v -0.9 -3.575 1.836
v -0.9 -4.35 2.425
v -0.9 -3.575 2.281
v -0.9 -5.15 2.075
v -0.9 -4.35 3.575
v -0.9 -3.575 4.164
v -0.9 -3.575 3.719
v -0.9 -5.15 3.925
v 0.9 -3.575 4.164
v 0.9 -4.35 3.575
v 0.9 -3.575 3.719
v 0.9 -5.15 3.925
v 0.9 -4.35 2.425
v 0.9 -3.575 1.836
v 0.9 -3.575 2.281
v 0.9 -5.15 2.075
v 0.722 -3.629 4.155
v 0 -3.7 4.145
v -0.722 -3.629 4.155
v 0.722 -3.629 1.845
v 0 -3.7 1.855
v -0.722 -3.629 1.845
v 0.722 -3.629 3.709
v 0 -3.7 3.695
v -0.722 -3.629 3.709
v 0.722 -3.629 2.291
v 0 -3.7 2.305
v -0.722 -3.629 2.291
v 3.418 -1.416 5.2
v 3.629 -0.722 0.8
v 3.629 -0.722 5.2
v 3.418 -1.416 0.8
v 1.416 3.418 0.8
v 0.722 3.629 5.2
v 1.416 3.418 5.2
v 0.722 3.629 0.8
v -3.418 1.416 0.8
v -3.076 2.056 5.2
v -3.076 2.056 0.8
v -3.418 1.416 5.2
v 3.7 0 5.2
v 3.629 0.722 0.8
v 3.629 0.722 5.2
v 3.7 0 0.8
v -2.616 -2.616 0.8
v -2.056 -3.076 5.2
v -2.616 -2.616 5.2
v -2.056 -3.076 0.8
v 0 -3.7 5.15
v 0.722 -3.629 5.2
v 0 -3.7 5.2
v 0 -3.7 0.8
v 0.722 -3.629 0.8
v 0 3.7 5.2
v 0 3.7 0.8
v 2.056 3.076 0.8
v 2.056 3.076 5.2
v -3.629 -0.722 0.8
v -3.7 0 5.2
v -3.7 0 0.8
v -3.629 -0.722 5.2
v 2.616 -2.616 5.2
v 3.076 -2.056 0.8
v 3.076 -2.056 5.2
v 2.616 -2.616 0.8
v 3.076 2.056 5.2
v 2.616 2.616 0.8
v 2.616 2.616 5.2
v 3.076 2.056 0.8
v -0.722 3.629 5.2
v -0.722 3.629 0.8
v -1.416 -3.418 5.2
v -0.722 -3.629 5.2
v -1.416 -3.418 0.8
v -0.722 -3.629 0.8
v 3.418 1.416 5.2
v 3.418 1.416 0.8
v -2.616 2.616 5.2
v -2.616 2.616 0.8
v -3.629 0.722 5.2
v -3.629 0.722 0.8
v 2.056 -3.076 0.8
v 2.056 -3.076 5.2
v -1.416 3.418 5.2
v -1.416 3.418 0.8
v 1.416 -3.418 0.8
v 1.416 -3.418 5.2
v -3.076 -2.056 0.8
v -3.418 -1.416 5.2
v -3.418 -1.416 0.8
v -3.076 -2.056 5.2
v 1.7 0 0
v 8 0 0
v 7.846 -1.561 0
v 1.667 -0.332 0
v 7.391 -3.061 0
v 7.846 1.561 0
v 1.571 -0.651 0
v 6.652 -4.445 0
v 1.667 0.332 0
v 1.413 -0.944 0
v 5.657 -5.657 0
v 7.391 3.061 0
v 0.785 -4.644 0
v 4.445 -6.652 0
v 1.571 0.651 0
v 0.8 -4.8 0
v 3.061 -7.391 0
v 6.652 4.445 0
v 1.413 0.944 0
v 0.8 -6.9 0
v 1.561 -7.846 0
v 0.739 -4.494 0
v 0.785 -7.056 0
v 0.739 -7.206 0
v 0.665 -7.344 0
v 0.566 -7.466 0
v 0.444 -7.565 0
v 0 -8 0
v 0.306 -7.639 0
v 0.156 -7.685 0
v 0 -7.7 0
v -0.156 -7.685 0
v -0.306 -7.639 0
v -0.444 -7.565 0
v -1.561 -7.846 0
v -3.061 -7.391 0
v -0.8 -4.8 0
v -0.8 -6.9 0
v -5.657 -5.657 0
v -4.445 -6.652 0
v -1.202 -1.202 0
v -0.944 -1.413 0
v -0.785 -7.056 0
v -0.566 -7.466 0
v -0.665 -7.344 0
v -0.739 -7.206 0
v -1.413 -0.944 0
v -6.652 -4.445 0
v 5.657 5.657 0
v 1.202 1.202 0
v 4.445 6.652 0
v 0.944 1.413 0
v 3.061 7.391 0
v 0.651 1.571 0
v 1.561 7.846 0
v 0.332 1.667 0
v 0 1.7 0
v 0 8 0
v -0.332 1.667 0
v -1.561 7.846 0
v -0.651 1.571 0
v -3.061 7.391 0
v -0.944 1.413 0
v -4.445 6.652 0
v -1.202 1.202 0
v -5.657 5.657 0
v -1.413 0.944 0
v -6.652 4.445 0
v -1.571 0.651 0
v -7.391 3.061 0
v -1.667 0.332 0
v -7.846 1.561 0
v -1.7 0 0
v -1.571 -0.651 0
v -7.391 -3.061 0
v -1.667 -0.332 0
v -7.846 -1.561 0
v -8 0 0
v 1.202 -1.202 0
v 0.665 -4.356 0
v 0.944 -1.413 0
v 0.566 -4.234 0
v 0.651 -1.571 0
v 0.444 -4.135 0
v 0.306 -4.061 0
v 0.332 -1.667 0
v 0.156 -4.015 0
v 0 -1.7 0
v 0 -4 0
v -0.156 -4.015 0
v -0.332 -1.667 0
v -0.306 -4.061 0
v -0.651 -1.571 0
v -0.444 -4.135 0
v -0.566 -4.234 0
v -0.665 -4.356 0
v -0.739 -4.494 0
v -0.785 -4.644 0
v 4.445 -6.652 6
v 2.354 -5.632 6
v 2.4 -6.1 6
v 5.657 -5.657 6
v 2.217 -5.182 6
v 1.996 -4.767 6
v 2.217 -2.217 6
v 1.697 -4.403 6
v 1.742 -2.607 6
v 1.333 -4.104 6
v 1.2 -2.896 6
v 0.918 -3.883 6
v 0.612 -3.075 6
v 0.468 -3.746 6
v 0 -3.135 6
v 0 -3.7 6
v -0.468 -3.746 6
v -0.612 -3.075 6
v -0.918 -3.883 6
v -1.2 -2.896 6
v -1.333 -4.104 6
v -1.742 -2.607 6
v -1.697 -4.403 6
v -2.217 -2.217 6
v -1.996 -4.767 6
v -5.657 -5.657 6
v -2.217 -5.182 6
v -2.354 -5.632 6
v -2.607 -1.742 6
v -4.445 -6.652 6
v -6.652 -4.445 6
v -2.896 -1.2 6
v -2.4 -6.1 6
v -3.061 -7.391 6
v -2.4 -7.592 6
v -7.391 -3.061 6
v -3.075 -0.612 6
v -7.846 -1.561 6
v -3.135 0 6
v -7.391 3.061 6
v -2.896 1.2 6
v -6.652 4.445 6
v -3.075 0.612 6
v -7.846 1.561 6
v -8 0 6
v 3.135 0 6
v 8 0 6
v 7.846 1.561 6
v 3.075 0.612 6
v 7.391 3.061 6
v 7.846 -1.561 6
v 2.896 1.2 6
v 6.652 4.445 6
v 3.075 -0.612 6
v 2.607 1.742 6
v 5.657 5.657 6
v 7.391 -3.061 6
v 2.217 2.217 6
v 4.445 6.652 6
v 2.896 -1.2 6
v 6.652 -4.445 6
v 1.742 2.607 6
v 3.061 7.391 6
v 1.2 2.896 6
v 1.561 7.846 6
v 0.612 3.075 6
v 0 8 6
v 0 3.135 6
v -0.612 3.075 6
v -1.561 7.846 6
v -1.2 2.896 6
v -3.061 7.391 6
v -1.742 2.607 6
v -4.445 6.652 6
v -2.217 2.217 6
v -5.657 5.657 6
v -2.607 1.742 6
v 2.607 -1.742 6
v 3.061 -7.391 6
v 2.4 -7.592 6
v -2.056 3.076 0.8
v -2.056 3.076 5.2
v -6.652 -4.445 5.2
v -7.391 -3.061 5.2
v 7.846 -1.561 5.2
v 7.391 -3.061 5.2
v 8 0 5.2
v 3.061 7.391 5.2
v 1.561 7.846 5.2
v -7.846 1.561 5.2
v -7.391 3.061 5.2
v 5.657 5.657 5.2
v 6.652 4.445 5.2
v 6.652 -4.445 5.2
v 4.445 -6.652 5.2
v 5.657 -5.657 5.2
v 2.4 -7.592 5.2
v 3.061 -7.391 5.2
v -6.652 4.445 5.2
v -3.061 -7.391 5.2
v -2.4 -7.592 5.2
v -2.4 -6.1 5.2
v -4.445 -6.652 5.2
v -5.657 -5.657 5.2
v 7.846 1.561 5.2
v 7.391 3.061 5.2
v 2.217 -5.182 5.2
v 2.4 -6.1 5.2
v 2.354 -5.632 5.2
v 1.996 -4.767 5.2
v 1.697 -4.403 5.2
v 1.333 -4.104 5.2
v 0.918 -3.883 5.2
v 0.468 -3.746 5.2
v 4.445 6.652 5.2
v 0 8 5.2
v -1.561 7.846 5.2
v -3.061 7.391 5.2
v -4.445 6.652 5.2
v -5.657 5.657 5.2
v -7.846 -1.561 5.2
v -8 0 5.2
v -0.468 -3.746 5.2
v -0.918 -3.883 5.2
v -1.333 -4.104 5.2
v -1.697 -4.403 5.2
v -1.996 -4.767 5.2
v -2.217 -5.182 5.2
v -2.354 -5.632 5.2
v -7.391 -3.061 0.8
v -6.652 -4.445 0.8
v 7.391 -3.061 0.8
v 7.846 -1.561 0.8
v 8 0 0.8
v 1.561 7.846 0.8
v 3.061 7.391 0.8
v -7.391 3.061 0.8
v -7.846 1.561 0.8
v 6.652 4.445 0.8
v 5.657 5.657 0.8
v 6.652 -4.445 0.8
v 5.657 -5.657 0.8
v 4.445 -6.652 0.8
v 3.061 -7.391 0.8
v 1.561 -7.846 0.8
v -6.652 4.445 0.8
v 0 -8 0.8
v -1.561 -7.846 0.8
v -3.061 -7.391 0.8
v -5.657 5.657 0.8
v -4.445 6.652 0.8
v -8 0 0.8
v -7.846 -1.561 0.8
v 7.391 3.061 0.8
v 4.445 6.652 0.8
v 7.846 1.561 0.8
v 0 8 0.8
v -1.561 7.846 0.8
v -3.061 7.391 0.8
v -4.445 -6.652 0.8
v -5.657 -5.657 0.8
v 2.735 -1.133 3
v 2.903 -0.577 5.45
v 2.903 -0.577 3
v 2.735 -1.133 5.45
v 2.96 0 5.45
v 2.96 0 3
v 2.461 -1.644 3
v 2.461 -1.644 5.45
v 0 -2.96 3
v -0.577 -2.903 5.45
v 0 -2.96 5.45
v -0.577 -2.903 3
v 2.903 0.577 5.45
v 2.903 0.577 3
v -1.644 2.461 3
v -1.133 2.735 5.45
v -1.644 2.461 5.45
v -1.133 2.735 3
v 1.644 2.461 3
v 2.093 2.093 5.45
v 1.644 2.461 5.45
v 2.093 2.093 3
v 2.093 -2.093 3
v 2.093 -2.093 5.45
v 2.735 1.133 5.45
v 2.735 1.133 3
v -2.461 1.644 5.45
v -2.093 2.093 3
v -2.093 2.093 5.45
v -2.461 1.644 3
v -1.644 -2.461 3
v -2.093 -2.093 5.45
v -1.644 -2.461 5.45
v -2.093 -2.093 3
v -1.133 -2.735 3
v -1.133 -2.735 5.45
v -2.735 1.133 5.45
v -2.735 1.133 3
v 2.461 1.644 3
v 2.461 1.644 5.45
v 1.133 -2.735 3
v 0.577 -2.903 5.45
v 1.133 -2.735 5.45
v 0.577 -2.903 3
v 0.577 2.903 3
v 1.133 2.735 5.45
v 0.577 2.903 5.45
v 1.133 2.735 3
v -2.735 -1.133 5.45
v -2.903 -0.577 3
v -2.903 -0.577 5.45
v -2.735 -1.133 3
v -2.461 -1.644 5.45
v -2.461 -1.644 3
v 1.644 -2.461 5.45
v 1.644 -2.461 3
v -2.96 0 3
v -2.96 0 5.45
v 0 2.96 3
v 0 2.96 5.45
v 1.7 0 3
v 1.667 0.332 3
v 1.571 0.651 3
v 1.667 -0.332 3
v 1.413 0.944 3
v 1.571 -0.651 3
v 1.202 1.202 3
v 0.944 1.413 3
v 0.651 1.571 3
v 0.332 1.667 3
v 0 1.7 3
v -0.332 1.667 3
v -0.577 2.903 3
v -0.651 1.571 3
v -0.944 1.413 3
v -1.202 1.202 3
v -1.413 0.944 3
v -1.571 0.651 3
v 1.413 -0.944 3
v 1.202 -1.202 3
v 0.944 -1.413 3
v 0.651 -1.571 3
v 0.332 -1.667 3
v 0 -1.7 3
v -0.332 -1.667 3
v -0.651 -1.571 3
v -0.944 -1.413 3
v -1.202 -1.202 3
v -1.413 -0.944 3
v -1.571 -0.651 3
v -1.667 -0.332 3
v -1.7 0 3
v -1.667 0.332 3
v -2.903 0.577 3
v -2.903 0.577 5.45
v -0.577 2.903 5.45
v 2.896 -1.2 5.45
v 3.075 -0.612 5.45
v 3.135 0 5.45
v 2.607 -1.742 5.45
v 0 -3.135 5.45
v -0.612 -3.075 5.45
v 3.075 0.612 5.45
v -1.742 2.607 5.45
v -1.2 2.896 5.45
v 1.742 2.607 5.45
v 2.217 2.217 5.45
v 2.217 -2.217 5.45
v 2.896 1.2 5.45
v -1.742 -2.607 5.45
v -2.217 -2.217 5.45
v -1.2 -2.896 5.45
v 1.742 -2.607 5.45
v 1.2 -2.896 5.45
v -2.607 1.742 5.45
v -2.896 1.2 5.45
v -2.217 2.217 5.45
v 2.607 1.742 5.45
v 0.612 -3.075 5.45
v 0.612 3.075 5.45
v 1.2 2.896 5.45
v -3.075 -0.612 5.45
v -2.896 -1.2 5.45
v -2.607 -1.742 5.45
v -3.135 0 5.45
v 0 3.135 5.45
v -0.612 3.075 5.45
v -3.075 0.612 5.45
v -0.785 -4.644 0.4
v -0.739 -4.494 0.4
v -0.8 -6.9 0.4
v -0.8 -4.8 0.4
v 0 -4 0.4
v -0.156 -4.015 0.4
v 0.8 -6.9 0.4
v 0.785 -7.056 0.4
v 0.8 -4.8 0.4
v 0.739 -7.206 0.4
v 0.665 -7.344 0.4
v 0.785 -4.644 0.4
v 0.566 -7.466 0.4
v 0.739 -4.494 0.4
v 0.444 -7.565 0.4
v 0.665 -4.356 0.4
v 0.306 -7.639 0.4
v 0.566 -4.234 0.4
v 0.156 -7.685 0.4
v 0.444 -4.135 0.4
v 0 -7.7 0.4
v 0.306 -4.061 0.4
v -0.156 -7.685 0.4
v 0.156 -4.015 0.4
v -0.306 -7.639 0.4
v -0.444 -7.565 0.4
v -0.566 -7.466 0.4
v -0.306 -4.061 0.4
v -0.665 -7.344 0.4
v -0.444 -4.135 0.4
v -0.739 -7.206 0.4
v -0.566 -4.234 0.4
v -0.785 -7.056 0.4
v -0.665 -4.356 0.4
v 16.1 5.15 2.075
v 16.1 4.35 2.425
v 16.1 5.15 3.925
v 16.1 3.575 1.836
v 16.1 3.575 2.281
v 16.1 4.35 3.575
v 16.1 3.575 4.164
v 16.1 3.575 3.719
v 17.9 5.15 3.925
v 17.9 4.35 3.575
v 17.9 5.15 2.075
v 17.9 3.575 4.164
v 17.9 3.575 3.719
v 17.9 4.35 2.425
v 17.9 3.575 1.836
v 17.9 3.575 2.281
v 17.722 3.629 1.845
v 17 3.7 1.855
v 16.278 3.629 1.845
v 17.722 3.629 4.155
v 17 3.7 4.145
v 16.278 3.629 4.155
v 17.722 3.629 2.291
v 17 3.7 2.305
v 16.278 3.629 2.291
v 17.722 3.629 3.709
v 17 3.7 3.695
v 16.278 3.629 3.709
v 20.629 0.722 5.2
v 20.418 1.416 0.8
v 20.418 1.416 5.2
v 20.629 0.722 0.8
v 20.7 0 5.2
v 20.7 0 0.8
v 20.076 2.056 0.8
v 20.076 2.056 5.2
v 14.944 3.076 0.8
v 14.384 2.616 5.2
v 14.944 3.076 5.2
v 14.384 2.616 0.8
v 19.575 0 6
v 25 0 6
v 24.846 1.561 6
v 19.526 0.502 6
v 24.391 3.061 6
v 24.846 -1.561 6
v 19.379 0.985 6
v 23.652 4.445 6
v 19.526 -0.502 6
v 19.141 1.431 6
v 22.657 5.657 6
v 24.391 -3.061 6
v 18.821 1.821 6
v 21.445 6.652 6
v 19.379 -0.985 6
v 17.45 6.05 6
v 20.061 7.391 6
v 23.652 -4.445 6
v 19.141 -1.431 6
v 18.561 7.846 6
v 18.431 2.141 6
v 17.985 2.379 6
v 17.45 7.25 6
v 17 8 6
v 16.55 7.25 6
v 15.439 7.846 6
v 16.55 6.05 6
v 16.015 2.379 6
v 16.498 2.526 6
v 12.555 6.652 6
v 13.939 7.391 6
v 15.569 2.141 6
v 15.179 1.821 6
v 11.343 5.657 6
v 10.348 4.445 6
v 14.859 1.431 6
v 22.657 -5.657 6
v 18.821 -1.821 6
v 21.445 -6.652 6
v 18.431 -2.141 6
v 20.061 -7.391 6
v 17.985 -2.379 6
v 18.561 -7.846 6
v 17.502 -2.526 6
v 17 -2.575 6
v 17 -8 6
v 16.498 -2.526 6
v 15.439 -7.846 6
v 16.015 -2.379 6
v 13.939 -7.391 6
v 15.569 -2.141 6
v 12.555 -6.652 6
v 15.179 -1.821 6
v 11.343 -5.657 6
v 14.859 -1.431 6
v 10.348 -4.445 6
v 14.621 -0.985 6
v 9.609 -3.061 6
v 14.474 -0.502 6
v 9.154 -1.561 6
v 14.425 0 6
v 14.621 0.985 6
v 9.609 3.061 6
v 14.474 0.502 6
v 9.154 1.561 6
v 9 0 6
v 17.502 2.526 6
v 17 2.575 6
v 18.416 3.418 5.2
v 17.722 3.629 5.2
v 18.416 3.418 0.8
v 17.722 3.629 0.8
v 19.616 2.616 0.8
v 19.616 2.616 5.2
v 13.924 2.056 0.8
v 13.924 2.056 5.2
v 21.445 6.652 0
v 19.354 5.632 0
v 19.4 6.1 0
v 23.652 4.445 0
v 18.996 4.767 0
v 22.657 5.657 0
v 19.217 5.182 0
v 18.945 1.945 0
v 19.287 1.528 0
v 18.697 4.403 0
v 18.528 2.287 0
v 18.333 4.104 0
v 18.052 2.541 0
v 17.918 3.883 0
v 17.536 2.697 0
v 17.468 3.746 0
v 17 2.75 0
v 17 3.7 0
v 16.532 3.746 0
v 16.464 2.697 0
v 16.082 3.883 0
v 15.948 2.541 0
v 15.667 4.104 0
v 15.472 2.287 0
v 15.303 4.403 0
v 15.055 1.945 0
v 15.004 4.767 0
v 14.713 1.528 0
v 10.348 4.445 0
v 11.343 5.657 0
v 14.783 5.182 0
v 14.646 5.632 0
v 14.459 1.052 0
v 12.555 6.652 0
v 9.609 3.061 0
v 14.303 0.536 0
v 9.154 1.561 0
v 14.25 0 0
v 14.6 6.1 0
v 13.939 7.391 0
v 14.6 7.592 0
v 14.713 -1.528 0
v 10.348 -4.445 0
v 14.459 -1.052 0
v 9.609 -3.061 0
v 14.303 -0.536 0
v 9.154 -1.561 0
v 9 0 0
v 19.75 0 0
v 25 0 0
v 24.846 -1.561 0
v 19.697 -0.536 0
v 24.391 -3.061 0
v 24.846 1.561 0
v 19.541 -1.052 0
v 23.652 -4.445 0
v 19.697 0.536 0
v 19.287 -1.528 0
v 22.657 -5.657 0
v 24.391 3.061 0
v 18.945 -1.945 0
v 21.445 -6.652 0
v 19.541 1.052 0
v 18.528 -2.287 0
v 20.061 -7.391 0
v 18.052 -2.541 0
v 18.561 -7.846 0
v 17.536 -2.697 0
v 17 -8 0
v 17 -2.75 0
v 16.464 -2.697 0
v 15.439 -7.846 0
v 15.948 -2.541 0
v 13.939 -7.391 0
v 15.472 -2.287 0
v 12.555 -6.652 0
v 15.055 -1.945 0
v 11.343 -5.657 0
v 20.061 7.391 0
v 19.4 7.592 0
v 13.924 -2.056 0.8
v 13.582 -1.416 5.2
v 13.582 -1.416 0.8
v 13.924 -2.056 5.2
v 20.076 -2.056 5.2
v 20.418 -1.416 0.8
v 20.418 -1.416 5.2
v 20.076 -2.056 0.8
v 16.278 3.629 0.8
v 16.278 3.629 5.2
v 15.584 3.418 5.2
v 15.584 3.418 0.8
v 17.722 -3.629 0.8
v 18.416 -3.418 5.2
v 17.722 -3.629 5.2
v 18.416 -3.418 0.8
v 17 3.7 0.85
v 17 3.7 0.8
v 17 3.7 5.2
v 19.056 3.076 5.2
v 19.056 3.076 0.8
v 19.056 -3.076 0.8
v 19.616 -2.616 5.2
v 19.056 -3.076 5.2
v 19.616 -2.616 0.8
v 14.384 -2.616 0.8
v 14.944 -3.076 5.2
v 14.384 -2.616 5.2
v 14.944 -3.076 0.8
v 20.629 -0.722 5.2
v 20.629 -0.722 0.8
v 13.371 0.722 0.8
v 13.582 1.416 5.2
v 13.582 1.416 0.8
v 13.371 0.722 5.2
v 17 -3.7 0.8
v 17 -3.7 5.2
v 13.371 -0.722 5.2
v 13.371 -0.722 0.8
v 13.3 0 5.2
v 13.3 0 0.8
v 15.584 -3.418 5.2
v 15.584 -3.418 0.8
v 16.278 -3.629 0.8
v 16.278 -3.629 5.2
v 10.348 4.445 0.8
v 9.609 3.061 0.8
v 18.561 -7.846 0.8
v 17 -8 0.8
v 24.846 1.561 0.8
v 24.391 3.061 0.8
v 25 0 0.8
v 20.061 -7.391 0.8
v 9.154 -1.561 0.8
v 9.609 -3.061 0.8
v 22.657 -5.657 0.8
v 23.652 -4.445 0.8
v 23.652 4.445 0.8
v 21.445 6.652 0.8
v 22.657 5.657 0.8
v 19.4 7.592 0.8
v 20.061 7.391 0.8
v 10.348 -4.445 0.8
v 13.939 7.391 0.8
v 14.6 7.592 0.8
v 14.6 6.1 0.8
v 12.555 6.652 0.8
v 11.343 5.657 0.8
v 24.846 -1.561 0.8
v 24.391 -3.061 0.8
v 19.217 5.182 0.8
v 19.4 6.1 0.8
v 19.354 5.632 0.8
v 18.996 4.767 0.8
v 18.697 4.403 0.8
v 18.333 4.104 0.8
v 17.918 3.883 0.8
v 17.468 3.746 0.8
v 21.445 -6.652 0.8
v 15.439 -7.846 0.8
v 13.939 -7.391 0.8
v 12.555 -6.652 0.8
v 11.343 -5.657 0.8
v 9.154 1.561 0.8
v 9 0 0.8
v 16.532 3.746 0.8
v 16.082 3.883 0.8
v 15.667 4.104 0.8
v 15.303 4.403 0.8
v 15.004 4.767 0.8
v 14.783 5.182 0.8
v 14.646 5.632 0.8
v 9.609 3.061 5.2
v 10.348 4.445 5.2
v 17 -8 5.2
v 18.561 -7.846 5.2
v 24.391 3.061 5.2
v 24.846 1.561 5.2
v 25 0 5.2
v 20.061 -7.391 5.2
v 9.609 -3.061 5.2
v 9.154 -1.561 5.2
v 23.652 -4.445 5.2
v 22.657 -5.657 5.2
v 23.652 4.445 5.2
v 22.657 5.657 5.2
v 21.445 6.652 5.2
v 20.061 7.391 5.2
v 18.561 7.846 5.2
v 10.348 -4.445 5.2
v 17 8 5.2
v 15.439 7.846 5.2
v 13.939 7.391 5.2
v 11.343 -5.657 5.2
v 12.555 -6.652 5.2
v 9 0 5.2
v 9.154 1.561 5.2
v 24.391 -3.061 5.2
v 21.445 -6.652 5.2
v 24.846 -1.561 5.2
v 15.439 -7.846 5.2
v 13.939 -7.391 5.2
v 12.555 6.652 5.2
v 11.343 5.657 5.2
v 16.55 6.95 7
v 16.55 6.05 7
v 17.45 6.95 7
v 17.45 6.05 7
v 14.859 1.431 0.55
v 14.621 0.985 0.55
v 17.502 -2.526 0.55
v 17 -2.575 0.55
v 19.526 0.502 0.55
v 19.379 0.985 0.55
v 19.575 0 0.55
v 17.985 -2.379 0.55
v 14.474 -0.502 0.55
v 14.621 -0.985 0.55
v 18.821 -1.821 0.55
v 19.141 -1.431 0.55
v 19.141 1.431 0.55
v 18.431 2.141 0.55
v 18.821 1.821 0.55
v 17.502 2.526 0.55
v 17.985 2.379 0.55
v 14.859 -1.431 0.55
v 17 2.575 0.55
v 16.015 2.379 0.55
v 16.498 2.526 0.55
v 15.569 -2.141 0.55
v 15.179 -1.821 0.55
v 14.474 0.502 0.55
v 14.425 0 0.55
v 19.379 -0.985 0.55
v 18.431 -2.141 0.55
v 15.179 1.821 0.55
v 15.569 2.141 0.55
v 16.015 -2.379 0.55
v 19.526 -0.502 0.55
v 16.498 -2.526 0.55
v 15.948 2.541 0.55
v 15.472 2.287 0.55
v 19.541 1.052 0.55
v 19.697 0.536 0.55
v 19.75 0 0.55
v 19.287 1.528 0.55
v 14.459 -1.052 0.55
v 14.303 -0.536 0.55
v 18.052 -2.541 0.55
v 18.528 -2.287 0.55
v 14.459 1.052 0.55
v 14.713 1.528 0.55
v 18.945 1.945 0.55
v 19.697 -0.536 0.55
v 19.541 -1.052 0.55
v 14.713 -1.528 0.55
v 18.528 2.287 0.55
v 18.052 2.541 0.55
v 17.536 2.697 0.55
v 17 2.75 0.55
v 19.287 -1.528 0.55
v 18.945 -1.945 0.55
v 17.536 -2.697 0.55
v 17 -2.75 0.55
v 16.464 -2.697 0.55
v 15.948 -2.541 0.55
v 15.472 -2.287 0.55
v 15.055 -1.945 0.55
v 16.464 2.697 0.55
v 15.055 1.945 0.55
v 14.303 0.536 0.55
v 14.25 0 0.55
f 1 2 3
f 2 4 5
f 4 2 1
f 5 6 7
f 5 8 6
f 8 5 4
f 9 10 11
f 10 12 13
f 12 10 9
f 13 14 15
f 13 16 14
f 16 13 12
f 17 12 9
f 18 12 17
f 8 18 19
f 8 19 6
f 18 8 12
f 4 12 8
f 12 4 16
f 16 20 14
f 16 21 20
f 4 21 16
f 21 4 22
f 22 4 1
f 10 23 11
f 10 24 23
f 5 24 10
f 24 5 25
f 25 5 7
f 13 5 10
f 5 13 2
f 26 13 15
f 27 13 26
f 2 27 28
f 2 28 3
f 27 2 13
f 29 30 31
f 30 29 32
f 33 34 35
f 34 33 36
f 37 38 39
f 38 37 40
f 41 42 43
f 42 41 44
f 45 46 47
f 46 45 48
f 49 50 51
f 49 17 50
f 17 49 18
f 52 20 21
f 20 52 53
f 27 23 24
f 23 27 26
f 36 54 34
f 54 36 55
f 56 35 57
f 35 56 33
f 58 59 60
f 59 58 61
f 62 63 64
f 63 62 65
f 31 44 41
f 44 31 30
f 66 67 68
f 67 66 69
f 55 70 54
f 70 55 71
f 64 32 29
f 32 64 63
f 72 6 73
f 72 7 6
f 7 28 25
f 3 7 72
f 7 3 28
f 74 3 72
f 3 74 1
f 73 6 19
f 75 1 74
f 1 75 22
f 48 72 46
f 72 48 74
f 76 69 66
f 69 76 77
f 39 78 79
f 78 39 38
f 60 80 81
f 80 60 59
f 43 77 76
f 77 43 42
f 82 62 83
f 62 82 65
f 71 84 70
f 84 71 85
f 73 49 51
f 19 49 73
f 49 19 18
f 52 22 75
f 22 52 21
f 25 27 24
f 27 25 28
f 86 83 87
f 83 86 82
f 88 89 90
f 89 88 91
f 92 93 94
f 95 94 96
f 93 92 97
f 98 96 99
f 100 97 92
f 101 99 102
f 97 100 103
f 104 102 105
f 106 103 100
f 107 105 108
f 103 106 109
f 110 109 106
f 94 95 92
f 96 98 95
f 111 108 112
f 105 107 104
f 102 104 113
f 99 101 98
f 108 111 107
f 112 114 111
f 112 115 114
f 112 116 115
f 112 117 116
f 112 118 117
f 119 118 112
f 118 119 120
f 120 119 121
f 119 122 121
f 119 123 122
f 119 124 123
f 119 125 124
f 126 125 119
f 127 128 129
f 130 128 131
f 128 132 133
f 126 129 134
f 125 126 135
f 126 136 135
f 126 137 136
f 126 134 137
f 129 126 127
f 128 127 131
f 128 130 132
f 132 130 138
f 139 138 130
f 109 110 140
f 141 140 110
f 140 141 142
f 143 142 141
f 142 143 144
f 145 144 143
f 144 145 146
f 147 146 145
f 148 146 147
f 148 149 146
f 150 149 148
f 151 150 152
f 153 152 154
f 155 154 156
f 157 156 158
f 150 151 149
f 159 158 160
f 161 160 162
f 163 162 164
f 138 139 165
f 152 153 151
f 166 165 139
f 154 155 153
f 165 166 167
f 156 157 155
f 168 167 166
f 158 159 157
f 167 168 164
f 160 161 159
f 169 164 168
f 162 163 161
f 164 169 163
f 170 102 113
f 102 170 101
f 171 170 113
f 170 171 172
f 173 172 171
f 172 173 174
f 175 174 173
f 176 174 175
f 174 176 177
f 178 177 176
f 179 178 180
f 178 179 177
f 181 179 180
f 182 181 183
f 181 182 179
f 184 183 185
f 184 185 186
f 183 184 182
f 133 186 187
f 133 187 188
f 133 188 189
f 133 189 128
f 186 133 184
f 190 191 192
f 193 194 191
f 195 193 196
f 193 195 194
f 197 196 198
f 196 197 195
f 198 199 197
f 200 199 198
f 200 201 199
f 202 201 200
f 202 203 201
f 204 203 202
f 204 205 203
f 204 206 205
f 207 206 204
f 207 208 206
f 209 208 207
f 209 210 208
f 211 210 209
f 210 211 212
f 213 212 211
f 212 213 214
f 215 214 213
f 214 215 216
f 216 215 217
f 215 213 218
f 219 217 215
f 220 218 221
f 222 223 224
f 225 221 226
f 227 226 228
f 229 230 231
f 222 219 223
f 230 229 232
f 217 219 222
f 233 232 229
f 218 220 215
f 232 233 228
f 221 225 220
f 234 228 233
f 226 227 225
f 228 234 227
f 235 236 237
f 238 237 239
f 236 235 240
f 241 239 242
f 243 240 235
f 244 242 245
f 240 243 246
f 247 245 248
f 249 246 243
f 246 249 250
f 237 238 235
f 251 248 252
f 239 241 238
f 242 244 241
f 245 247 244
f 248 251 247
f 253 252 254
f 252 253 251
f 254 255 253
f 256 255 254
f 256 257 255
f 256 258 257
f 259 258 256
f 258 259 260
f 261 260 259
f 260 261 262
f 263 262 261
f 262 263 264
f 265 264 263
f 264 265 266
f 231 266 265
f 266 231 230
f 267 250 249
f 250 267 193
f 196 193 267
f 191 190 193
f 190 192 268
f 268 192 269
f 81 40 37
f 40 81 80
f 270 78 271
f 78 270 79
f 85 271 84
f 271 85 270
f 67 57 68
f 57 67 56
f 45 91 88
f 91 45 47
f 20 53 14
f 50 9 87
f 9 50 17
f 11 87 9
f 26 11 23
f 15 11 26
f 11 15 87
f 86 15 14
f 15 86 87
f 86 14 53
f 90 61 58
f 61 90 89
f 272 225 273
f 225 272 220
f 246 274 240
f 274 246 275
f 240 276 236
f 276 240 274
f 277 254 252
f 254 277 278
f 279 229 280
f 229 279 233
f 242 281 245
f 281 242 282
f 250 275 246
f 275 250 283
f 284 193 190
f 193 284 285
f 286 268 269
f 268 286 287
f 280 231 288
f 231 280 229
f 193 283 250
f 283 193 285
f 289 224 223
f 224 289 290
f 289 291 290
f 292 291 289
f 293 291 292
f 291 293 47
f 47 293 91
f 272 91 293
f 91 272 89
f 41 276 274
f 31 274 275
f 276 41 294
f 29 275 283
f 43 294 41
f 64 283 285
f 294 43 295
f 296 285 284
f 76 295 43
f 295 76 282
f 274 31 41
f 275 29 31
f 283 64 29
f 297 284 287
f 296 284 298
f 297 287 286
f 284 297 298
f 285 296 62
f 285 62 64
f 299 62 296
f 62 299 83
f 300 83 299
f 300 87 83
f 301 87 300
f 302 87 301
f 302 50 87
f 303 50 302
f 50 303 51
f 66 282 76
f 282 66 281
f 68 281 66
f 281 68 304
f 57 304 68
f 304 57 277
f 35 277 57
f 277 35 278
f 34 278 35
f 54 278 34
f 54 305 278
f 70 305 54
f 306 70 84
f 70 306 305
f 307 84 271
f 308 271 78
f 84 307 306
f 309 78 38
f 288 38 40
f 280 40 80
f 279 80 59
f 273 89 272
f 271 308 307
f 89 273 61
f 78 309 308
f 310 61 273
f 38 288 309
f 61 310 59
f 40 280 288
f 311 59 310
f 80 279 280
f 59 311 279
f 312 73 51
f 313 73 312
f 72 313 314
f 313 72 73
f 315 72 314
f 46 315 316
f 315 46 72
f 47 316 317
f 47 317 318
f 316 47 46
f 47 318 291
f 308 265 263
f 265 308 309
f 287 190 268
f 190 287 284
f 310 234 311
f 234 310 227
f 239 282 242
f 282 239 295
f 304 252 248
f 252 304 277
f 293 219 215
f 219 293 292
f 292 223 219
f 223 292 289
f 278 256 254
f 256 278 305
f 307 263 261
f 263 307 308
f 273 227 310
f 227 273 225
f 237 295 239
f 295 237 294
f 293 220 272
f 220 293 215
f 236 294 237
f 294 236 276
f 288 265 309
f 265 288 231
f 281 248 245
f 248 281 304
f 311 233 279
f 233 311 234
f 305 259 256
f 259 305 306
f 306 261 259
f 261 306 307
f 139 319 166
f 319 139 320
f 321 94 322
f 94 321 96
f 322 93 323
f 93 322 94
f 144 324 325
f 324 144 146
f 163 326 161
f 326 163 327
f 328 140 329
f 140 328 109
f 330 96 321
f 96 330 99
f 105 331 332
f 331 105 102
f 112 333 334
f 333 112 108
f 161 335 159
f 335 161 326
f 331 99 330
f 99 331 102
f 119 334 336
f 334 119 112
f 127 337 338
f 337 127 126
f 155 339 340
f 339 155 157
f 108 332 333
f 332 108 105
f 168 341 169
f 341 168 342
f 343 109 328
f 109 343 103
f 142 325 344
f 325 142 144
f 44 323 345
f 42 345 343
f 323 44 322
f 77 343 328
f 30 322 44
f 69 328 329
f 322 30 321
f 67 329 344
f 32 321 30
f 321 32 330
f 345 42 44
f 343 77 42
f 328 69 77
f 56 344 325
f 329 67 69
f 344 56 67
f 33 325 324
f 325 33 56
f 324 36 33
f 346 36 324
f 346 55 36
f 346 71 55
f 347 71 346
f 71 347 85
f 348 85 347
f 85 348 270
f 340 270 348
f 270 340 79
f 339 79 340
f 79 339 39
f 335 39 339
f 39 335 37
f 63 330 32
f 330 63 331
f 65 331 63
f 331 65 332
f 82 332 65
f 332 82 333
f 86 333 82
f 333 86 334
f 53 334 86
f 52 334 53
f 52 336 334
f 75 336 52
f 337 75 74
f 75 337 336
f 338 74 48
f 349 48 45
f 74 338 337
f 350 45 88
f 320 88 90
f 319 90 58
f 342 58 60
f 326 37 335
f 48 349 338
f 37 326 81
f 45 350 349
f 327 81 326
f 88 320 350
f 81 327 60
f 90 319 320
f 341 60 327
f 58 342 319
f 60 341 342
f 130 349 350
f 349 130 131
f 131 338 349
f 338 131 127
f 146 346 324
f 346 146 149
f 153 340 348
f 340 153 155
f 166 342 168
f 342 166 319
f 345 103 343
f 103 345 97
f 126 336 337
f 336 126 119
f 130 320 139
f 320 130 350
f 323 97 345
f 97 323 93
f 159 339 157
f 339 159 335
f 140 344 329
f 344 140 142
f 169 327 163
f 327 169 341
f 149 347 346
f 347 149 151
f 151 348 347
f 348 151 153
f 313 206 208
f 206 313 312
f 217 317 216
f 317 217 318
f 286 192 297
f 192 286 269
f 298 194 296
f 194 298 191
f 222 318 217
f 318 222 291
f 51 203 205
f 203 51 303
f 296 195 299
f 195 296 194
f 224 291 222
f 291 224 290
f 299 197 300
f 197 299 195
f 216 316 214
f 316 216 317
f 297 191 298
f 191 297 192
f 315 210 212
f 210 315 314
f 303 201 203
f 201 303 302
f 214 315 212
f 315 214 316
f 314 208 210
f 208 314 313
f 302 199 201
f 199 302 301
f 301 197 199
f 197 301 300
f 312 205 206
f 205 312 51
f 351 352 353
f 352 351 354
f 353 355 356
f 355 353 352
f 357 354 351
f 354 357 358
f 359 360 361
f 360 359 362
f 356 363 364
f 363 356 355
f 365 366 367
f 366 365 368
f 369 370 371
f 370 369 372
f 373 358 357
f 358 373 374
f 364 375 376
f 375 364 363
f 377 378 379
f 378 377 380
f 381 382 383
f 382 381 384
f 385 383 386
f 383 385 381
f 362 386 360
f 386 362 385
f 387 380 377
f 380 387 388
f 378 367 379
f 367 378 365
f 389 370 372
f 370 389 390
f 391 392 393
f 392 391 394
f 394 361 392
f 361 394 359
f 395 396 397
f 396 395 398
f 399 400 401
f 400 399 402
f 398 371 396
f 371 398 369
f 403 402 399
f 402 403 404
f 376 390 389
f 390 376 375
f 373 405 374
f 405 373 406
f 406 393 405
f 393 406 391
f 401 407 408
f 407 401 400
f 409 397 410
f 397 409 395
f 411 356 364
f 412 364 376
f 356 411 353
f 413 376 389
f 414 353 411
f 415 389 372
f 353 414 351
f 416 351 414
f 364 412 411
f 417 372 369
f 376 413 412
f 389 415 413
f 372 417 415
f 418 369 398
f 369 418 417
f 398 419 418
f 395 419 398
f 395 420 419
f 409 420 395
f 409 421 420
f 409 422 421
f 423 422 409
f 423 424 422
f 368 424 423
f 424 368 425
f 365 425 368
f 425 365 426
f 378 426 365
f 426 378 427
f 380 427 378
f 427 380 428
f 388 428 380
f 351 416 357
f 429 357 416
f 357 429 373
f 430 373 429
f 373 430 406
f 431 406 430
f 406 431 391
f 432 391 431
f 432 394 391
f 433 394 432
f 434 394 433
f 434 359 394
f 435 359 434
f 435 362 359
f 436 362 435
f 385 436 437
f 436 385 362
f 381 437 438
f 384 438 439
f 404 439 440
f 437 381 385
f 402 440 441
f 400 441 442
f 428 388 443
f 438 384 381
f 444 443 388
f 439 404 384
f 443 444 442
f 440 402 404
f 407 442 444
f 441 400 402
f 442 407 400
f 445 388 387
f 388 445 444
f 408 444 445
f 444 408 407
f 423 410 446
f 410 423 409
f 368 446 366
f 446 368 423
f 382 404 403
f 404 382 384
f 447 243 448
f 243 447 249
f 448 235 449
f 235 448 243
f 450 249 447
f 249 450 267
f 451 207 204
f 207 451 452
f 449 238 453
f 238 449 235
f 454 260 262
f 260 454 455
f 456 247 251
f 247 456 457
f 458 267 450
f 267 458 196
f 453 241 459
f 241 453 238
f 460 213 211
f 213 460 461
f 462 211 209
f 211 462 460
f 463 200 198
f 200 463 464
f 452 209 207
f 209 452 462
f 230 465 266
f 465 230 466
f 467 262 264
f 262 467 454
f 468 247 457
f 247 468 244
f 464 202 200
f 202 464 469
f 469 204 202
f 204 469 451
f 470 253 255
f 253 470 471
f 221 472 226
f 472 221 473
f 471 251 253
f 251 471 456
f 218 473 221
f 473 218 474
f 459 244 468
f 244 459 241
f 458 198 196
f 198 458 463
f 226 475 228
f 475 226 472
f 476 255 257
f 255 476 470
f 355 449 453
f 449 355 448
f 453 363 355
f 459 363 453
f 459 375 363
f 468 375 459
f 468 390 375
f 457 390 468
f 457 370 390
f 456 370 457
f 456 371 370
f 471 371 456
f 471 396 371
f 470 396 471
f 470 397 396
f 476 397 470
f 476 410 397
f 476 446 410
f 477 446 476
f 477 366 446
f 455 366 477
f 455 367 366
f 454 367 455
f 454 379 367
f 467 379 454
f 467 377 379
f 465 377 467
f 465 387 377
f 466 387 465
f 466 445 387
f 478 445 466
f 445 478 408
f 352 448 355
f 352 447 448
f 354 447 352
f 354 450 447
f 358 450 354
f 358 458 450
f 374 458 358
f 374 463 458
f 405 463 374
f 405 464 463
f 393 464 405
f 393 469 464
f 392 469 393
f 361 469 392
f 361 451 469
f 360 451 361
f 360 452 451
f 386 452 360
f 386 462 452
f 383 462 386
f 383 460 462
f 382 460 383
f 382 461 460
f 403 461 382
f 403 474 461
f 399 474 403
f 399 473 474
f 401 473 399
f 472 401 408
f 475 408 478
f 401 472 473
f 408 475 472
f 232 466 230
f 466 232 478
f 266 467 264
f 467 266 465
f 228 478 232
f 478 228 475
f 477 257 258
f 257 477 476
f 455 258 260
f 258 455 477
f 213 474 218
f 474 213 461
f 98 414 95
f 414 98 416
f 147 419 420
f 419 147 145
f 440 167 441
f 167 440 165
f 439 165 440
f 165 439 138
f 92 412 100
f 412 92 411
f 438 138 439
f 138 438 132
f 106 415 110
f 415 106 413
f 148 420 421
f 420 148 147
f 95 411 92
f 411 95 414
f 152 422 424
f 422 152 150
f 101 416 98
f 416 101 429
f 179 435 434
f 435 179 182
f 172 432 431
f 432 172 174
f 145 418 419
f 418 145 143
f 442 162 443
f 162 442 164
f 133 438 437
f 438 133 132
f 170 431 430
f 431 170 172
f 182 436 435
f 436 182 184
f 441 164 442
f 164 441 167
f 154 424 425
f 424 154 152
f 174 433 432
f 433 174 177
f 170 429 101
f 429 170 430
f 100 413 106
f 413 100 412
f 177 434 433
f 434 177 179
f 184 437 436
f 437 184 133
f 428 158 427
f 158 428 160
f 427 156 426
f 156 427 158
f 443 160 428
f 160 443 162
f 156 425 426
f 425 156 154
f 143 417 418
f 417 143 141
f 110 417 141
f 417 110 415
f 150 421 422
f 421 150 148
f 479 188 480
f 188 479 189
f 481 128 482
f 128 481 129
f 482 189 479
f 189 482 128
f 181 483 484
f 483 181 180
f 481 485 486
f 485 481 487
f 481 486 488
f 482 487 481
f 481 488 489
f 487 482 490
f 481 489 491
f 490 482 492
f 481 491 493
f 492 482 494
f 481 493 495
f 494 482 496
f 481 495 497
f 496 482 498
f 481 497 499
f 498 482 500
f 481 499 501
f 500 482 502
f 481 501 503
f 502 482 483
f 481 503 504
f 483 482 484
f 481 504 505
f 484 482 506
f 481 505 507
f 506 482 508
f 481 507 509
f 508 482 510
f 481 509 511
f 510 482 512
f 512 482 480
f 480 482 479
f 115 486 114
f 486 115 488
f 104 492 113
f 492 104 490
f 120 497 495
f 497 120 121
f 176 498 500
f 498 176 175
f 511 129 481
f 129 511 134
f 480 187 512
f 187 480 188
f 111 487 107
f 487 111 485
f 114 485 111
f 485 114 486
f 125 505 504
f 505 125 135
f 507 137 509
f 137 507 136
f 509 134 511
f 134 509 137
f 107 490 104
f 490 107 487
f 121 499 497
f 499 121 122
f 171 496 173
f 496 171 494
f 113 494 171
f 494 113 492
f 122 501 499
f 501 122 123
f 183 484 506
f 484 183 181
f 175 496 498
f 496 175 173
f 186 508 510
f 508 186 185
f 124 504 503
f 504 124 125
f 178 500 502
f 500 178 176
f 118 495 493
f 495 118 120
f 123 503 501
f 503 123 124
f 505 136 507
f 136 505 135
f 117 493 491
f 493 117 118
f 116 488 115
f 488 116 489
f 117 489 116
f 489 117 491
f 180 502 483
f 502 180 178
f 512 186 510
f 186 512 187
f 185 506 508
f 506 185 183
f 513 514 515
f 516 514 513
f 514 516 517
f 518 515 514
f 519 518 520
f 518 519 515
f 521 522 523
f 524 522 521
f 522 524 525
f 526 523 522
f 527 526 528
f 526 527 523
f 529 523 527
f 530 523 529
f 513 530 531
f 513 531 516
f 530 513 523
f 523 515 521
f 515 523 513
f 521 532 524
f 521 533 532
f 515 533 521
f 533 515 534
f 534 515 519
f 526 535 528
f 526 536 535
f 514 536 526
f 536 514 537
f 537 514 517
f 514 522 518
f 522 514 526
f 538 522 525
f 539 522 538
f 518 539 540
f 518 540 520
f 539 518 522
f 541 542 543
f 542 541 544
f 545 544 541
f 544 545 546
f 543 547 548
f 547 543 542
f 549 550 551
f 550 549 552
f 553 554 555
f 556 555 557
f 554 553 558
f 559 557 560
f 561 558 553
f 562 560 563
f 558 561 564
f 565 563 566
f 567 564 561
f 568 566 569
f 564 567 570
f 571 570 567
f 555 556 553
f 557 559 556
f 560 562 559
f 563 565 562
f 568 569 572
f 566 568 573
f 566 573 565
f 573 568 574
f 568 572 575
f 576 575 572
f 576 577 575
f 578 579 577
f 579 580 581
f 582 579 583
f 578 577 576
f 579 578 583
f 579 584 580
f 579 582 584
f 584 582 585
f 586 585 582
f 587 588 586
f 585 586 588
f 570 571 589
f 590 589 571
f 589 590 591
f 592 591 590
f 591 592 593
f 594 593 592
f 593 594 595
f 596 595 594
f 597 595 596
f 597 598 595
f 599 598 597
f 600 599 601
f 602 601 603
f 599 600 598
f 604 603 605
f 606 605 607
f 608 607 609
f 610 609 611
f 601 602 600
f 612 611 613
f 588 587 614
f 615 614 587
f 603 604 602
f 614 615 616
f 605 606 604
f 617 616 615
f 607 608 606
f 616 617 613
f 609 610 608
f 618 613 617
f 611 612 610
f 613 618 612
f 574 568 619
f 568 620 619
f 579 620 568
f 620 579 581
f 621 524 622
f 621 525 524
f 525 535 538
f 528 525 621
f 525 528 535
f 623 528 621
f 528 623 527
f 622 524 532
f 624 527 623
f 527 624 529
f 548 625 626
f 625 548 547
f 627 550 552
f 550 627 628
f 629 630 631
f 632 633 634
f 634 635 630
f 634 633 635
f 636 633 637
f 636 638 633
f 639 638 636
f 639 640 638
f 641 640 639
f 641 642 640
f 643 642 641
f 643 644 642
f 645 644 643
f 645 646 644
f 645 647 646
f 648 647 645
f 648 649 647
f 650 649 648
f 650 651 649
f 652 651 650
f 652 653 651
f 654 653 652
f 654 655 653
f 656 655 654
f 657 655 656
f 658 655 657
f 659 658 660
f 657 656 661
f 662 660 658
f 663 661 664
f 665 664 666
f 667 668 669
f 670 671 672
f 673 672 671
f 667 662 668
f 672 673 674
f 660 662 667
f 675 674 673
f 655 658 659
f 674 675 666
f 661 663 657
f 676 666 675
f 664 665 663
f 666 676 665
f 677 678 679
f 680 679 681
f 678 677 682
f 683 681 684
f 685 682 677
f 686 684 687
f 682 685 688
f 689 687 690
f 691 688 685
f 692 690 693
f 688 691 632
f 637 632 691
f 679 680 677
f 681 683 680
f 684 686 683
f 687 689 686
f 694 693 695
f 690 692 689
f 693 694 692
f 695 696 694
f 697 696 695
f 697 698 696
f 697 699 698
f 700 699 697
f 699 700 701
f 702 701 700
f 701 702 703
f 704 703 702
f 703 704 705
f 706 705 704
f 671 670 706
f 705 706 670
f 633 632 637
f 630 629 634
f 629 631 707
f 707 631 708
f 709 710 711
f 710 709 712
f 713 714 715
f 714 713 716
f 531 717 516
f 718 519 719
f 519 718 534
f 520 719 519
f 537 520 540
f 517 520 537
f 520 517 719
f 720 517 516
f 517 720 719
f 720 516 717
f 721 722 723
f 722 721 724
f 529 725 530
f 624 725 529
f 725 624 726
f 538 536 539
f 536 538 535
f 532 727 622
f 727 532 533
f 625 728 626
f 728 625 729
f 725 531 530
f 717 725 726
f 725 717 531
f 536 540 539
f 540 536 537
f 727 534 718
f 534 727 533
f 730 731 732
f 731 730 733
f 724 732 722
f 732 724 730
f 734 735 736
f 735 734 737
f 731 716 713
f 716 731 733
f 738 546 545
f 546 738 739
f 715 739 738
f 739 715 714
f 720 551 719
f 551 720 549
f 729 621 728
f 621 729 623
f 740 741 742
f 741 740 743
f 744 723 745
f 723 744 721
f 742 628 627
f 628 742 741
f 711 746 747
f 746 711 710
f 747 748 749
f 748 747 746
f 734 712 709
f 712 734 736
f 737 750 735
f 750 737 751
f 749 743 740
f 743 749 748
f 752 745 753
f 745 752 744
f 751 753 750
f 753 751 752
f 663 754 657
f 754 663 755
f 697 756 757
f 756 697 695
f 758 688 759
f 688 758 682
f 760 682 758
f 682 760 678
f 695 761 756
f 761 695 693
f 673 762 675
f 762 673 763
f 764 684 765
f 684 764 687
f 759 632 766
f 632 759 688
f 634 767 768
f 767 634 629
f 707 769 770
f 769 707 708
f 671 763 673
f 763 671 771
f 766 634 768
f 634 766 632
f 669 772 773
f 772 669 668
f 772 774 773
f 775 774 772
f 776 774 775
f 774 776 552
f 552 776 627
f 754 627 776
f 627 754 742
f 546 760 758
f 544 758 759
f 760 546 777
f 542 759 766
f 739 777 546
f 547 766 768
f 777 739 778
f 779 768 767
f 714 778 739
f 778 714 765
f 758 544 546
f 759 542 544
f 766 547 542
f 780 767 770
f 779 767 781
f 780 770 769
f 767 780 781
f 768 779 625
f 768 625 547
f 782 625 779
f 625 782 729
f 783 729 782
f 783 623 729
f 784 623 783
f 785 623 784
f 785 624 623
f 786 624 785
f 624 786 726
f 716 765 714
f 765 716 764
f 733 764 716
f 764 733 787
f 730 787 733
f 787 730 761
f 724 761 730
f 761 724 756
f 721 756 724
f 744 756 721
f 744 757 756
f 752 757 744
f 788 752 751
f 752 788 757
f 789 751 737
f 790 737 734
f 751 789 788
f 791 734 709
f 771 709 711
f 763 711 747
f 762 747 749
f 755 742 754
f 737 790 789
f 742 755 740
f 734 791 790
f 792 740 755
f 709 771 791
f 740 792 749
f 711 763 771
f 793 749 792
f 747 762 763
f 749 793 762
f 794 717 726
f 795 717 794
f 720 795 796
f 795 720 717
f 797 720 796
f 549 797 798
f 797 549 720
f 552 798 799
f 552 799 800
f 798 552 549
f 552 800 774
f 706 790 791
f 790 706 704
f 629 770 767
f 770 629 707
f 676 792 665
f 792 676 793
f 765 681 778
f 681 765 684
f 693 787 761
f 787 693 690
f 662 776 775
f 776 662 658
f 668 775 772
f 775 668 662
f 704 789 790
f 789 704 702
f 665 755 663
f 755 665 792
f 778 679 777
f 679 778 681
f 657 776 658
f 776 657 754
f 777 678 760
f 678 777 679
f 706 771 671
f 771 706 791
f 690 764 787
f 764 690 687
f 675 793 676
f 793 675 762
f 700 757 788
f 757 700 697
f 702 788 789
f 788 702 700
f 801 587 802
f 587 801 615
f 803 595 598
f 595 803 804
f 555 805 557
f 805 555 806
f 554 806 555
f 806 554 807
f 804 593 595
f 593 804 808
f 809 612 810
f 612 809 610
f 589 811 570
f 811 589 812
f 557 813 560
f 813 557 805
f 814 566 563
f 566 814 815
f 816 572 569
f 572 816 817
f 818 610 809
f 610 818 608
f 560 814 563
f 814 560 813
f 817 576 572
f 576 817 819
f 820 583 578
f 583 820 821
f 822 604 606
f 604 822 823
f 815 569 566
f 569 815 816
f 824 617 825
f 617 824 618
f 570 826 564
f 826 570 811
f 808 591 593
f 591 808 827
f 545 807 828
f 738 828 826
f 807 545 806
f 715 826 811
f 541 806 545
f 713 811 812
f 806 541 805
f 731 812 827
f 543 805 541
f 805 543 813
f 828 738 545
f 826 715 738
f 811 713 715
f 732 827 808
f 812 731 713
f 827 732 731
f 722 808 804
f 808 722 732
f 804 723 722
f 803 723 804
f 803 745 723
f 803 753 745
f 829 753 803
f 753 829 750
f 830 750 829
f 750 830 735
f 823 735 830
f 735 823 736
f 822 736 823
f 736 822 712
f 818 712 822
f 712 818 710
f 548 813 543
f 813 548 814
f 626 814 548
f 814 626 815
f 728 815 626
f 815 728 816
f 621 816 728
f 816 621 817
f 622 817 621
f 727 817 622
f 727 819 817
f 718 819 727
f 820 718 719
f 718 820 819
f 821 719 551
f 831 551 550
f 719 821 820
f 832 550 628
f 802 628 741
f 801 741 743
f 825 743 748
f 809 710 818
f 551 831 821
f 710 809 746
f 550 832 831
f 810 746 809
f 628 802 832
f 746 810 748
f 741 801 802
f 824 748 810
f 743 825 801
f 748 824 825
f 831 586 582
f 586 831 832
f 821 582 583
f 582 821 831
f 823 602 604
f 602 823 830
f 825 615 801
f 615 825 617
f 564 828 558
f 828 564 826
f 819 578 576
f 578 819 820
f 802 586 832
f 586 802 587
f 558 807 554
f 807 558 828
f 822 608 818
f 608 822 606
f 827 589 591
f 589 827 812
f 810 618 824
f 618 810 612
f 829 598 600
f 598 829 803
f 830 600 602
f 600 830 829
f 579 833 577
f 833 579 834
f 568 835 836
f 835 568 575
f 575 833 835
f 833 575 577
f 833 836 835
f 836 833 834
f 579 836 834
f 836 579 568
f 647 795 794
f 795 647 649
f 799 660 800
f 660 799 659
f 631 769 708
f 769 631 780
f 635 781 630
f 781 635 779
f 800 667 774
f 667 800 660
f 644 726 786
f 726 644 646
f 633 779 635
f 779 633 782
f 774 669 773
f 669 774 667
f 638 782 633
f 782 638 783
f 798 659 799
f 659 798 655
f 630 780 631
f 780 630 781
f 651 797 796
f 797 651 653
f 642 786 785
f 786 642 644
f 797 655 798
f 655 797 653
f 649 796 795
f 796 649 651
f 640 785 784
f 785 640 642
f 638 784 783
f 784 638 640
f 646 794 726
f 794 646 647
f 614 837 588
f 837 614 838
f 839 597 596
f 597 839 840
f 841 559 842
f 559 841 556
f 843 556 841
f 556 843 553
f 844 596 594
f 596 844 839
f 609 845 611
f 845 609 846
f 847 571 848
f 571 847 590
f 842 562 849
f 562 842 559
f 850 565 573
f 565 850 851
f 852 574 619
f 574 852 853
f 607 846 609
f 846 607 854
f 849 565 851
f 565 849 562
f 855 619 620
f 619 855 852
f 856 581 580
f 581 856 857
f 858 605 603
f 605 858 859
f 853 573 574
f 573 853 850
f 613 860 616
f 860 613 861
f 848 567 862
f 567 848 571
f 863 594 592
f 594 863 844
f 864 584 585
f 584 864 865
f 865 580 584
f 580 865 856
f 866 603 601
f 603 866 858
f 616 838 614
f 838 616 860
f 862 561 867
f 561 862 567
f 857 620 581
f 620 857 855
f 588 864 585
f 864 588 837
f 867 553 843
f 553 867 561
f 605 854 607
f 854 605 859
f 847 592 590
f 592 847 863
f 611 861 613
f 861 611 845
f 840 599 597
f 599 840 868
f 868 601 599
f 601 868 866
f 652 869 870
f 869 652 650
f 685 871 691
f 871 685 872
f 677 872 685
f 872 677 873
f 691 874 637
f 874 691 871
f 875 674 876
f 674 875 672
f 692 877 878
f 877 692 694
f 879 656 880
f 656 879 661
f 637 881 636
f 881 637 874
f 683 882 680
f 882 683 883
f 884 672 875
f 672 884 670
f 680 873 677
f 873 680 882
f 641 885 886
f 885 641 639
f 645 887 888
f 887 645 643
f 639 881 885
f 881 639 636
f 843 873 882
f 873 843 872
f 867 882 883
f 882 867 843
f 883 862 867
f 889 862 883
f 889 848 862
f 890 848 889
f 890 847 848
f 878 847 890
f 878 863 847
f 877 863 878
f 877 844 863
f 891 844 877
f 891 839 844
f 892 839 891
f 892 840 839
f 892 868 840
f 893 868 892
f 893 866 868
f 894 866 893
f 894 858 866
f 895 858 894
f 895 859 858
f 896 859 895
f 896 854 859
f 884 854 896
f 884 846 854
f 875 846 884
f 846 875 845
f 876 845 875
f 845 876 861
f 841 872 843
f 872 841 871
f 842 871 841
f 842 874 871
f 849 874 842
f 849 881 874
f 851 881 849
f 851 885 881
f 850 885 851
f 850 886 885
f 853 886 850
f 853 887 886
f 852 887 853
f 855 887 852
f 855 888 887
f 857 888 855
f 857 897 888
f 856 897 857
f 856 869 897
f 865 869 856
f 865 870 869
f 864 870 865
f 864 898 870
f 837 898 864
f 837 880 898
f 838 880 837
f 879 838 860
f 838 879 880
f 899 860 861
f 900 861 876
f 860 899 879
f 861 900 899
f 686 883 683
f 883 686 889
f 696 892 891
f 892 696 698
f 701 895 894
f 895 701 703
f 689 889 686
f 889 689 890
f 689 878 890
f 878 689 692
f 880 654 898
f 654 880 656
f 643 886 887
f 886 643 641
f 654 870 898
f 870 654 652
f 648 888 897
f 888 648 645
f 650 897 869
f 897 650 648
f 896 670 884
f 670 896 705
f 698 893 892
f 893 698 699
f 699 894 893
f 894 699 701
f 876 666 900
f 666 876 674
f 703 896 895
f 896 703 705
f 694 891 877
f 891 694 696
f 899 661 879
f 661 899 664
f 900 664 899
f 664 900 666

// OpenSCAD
// DOUBLE TAKE FRAMES DESIGN RELEASE
// DTF_RELEASE: 2.0.1
// Released: 2026-09-02
// Versioning: Semantic Versioning 2.0.0 (https://semver.org/)
// Status: CANONICAL
// Changes in 2.0.1:
// - Carried forward unchanged for the prepared-project packaging correction.
// Changes in 2.0.0:
// - Uses captive 16 mm flanges coordinated with the revised clock-string guide.
// - Adds keyed bottom-flange loading slots and revised string anchors.
// Full release notes: https://doubletakeframes.com/build/#design-release
//
// Canonical captive-flange capstans.
//
// The capstans use 16 mm flanges. The hour horn is moved outward to suit that
// flange, and the upside-down minute capstan uses a recessed orientation mark.
// Canonical bores, drum geometry, heights, and the eyelet's 9 mm datum remain.

$fn = 32;
eps = 0.05;

// Selected fits retained from canonical. These modeled bores deliberately
// differ from the supplied movement-member ODs: 3.17 mm inner and 5.05 mm
// middle. They are fit dimensions, not transcriptions of movement specs.
minute_bore_d = is_undef(shared_minute_capstan_bore_d)
    ? 3.40 : shared_minute_capstan_bore_d;
hour_bores = [5.15];
minute_lower_clearance_d = 5.92;
minute_lower_clearance_h = 3.0; // Preserve canonical transition datum.

// Main geometry. The added height moves only the upper flange; established
// lower seating, anchor, and minute-bore-transition datums remain unchanged.
canonical_total_h = 5.0;
total_h = is_undef(shared_capstan_total_h)
    ? 6.0 : shared_capstan_total_h;
flange_h = 0.80;
drum_d = 7.4; // Printed winding-drum OD; unrelated to movement sleeve specs.
flange_d = is_undef(shared_capstan_flange_d)
    ? 16.0 : shared_capstan_flange_d; // MOCKUP: canonical is 9.0
eyelet_reference_flange_d = 9.0; // Keep canonical eyelet outer position.
bore_mouth_extra = 0.35;
bore_mouth_h = 0.55;
part_spacing_x = flange_d+1;     // Preserve 1 mm between enlarged parts.

// Bottom-flange installation key. It shares the fixed beak/string-anchor
// radial datum (+Y) and cannot accept the beak when the capstan is upside down.
bottom_insertion_notch_enabled = is_undef(shared_bottom_insertion_notch_enabled)
    ? true : shared_bottom_insertion_notch_enabled;
bottom_insertion_notch_clearance_per_side =
    is_undef(shared_beak_notch_clearance_per_side)
        ? 0.40 : shared_beak_notch_clearance_per_side;
bottom_insertion_notch_w_x =
    (is_undef(shared_beak_tangential_w) ? 4.0 : shared_beak_tangential_w)
    + 2*bottom_insertion_notch_clearance_per_side;

// ---------- sacrificial print supports ----------

breakaway_supports_enabled = false;
breakaway_support_count = 6;
breakaway_post_radius = 7.3;
breakaway_body_d = 1.2;
breakaway_neck_d = 0.65;
breakaway_neck_h = 0.30;

// Existing external string anchor retained unchanged.
string_eyelet_enabled = true;
string_eyelet_flange_gap_z = 0.60;
string_eyelet_w_x = 1.8;
string_eyelet_drum_overlap_y = 0.20;
string_eyelet_beyond_flange_y = is_undef(shared_string_eyelet_beyond_flange_y)
    ? 0.65 : shared_string_eyelet_beyond_flange_y;
string_eyelet_inner_face_h_z = 2.35;
string_eyelet_outer_face_h_z = 1.85;
string_eyelet_wall_z = 0.35;
string_eyelet_outer_wall_y = 0.8;    // Retain canonical hook-tip strength.
string_eyelet_void_inset_y = 0.70;

// Hour indicator horn: canonical size shifted radially toward the 16 mm rim.
indicator_horn_enabled = true;
indicator_horn_inner_y = 6.05;
indicator_horn_outer_y = 7.25;
indicator_horn_w_x = 0.90;
indicator_horn_h_z = 1.00;
indicator_horn_taper_y = 0.30;

// Bed-facing rounded orientation mark for the upside-down minute capstan.
// It stays inside the retaining rim and does not cut through the 0.8 mm flange.
minute_mark_w_x = 1.6;
minute_mark_y0 = 4.8;
minute_mark_y1 = 6.9;
minute_mark_depth_z = 0.40;

module cyl(d, h, z=0) {
    translate([0, 0, z]) cylinder(d=d, h=h);
}

module prism_x(points_yz, w_x) {
    n = len(points_yz);
    polyhedron(
        points = concat(
            [for (p = points_yz) [-w_x/2, p[0], p[1]]],
            [for (p = points_yz) [ w_x/2, p[0], p[1]]]
        ),
        faces = concat(
            [[for (i = [n-1:-1:0]) i]],
            [[for (i = [0:n-1]) i+n]],
            [for (i = [0:n-1]) [i, (i+1)%n, ((i+1)%n)+n, i+n]]
        )
    );
}

module top_indicator_horn(enabled=indicator_horn_enabled) {
    if (enabled)
        prism_x(
            [
                [indicator_horn_inner_y, total_h],
                [indicator_horn_outer_y, total_h],
                [indicator_horn_outer_y-indicator_horn_taper_y, total_h+indicator_horn_h_z],
                [indicator_horn_inner_y, total_h+indicator_horn_h_z]
            ],
            indicator_horn_w_x
        );
}

function eyelet_channel_z0() = flange_h + string_eyelet_flange_gap_z;
function eyelet_channel_z1() = total_h - flange_h - string_eyelet_flange_gap_z;
function eyelet_mid_z() = total_h/2; // Recenter with beak in widened gap.
function eyelet_inner_y() = drum_d/2 - string_eyelet_drum_overlap_y;
function eyelet_outer_y() = eyelet_reference_flange_d/2 + string_eyelet_beyond_flange_y;
function eyelet_inner_z0() = eyelet_mid_z() - string_eyelet_inner_face_h_z/2;
function eyelet_inner_z1() = eyelet_mid_z() + string_eyelet_inner_face_h_z/2;
function eyelet_outer_z0() = eyelet_mid_z() - string_eyelet_outer_face_h_z/2;
function eyelet_outer_z1() = eyelet_mid_z() + string_eyelet_outer_face_h_z/2;
function eyelet_void_inner_y() = drum_d/2 - string_eyelet_void_inset_y;
function eyelet_void_outer_y() = eyelet_outer_y() - string_eyelet_outer_wall_y;
function eyelet_void_inner_z0() = eyelet_inner_z0() + string_eyelet_wall_z;
function eyelet_void_inner_z1() = eyelet_inner_z1() - string_eyelet_wall_z;
function eyelet_void_outer_z0() = eyelet_outer_z0() + string_eyelet_wall_z;
function eyelet_void_outer_z1() = eyelet_outer_z1() - string_eyelet_wall_z;

module flipped_trapezoid_eyelet_solid_body() {
    intersection() {
        prism_x(
            [
                [eyelet_inner_y(), eyelet_inner_z0()],
                [eyelet_outer_y(), eyelet_outer_z0()],
                [eyelet_outer_y(), eyelet_outer_z1()],
                [eyelet_inner_y(), eyelet_inner_z1()]
            ],
            string_eyelet_w_x
        );
        translate([0, 0, total_h/2])
            cube([flange_d+2, flange_d+2, eyelet_channel_z1()-eyelet_channel_z0()], center=true);
    }
}

module flipped_trapezoid_eyelet_inner_polygon_void() {
    prism_x(
        [
            [eyelet_void_inner_y(), eyelet_void_inner_z0()],
            [eyelet_void_outer_y(), eyelet_void_outer_z0()],
            [eyelet_void_outer_y(), eyelet_void_outer_z1()],
            [eyelet_void_inner_y(), eyelet_void_inner_z1()]
        ],
        string_eyelet_w_x + 2*eps
    );
}

module polygon_cut_flipped_trapezoid_eyelet() {
    difference() {
        flipped_trapezoid_eyelet_solid_body();
        flipped_trapezoid_eyelet_inner_polygon_void();
    }
}

module bottom_insertion_notch() {
    if (bottom_insertion_notch_enabled)
        translate([0, 0, -eps])
            linear_extrude(height=flange_h+2*eps)
                hull() {
                    // Rounded inner end is tangent to the drum: no drum cut.
                    translate([0, drum_d/2+bottom_insertion_notch_w_x/2])
                        circle(d=bottom_insertion_notch_w_x);
                    // Carry the slot completely through the outer flange rim.
                    translate([0, flange_d/2+bottom_insertion_notch_w_x/2])
                        circle(d=bottom_insertion_notch_w_x);
                }
}

module capstan_shell(with_indicator_horn=true) {
    difference() {
        union() {
            cyl(drum_d, total_h);
            cyl(flange_d, flange_h);
            cyl(flange_d, flange_h, total_h-flange_h);
            if (string_eyelet_enabled) polygon_cut_flipped_trapezoid_eyelet();
            top_indicator_horn(with_indicator_horn && indicator_horn_enabled);
        }
        bottom_insertion_notch();
    }
}

module minute_orientation_mark() {
    translate([0, 0, total_h-minute_mark_depth_z])
        linear_extrude(height=minute_mark_depth_z+eps)
            hull()
                for (mark_y = [minute_mark_y0, minute_mark_y1])
                    translate([0, mark_y])
                        circle(d=minute_mark_w_x);
}

module minute_capstan() {
    difference() {
        // Printed upside down; omit the horn so the lower cavity prints cleanly.
        capstan_shell(with_indicator_horn=false);
        translate([0, 0, -eps])
            cylinder(d=minute_lower_clearance_d,
                     h=minute_lower_clearance_h+eps);
        translate([0, 0, -eps])
            cylinder(d=minute_lower_clearance_d+bore_mouth_extra, h=bore_mouth_h+eps);
        translate([0, 0, minute_lower_clearance_h])
            cylinder(d=minute_bore_d,
                     h=total_h-minute_lower_clearance_h+eps);
        minute_orientation_mark();
    }
}

module hour_capstan(bore_d=5.15) {
    difference() {
        capstan_shell(with_indicator_horn=true);
        translate([0, 0, -eps])
            cylinder(d=bore_d, h=total_h+2*eps);
        translate([0, 0, -eps])
            cylinder(d=bore_d+bore_mouth_extra, h=bore_mouth_h+eps);
    }
}

module breakaway_post(angle) {
    post_xy = [
        breakaway_post_radius*cos(angle),
        breakaway_post_radius*sin(angle)
    ];
    lower_flange_z1 = flange_h;
    upper_flange_z0 = total_h-flange_h;
    body_z0 = lower_flange_z1+breakaway_neck_h;
    body_z1 = upper_flange_z0-breakaway_neck_h;

    // Bottom snip neck, short rigid body, and top snip neck. The body remains
    // at the accessible outer edge and never approaches the eyelet sweep.
    translate([post_xy[0], post_xy[1], lower_flange_z1-eps])
        cylinder(d=breakaway_neck_d, h=breakaway_neck_h+eps);
    translate([post_xy[0], post_xy[1], body_z0-eps])
        cylinder(d=breakaway_body_d, h=body_z1-body_z0+2*eps);
    translate([post_xy[0], post_xy[1], body_z1])
        cylinder(d=breakaway_neck_d, h=breakaway_neck_h+eps);
}

module breakaway_post_set() {
    if (breakaway_supports_enabled)
        for (i=[0:breakaway_support_count-1])
            breakaway_post(i*360/breakaway_support_count);
}

module minute_capstan_print_layout() {
    // Former horn face on the bed; the recessed marker becomes a bed imprint.
    translate([0, 0, total_h])
        rotate([180, 0, 0])
            minute_capstan();
    breakaway_post_set();
}

module hour_capstan_print_layout(bore_d=5.15) {
    hour_capstan(bore_d);
    breakaway_post_set();
}

// Render minute + hour, matching the canonical file's deliverable pattern.
minute_capstan_print_layout();
for (i=[0:len(hour_bores)-1])
    translate([(i+1)*part_spacing_x, 0, 0])
        hour_capstan_print_layout(hour_bores[i]);
